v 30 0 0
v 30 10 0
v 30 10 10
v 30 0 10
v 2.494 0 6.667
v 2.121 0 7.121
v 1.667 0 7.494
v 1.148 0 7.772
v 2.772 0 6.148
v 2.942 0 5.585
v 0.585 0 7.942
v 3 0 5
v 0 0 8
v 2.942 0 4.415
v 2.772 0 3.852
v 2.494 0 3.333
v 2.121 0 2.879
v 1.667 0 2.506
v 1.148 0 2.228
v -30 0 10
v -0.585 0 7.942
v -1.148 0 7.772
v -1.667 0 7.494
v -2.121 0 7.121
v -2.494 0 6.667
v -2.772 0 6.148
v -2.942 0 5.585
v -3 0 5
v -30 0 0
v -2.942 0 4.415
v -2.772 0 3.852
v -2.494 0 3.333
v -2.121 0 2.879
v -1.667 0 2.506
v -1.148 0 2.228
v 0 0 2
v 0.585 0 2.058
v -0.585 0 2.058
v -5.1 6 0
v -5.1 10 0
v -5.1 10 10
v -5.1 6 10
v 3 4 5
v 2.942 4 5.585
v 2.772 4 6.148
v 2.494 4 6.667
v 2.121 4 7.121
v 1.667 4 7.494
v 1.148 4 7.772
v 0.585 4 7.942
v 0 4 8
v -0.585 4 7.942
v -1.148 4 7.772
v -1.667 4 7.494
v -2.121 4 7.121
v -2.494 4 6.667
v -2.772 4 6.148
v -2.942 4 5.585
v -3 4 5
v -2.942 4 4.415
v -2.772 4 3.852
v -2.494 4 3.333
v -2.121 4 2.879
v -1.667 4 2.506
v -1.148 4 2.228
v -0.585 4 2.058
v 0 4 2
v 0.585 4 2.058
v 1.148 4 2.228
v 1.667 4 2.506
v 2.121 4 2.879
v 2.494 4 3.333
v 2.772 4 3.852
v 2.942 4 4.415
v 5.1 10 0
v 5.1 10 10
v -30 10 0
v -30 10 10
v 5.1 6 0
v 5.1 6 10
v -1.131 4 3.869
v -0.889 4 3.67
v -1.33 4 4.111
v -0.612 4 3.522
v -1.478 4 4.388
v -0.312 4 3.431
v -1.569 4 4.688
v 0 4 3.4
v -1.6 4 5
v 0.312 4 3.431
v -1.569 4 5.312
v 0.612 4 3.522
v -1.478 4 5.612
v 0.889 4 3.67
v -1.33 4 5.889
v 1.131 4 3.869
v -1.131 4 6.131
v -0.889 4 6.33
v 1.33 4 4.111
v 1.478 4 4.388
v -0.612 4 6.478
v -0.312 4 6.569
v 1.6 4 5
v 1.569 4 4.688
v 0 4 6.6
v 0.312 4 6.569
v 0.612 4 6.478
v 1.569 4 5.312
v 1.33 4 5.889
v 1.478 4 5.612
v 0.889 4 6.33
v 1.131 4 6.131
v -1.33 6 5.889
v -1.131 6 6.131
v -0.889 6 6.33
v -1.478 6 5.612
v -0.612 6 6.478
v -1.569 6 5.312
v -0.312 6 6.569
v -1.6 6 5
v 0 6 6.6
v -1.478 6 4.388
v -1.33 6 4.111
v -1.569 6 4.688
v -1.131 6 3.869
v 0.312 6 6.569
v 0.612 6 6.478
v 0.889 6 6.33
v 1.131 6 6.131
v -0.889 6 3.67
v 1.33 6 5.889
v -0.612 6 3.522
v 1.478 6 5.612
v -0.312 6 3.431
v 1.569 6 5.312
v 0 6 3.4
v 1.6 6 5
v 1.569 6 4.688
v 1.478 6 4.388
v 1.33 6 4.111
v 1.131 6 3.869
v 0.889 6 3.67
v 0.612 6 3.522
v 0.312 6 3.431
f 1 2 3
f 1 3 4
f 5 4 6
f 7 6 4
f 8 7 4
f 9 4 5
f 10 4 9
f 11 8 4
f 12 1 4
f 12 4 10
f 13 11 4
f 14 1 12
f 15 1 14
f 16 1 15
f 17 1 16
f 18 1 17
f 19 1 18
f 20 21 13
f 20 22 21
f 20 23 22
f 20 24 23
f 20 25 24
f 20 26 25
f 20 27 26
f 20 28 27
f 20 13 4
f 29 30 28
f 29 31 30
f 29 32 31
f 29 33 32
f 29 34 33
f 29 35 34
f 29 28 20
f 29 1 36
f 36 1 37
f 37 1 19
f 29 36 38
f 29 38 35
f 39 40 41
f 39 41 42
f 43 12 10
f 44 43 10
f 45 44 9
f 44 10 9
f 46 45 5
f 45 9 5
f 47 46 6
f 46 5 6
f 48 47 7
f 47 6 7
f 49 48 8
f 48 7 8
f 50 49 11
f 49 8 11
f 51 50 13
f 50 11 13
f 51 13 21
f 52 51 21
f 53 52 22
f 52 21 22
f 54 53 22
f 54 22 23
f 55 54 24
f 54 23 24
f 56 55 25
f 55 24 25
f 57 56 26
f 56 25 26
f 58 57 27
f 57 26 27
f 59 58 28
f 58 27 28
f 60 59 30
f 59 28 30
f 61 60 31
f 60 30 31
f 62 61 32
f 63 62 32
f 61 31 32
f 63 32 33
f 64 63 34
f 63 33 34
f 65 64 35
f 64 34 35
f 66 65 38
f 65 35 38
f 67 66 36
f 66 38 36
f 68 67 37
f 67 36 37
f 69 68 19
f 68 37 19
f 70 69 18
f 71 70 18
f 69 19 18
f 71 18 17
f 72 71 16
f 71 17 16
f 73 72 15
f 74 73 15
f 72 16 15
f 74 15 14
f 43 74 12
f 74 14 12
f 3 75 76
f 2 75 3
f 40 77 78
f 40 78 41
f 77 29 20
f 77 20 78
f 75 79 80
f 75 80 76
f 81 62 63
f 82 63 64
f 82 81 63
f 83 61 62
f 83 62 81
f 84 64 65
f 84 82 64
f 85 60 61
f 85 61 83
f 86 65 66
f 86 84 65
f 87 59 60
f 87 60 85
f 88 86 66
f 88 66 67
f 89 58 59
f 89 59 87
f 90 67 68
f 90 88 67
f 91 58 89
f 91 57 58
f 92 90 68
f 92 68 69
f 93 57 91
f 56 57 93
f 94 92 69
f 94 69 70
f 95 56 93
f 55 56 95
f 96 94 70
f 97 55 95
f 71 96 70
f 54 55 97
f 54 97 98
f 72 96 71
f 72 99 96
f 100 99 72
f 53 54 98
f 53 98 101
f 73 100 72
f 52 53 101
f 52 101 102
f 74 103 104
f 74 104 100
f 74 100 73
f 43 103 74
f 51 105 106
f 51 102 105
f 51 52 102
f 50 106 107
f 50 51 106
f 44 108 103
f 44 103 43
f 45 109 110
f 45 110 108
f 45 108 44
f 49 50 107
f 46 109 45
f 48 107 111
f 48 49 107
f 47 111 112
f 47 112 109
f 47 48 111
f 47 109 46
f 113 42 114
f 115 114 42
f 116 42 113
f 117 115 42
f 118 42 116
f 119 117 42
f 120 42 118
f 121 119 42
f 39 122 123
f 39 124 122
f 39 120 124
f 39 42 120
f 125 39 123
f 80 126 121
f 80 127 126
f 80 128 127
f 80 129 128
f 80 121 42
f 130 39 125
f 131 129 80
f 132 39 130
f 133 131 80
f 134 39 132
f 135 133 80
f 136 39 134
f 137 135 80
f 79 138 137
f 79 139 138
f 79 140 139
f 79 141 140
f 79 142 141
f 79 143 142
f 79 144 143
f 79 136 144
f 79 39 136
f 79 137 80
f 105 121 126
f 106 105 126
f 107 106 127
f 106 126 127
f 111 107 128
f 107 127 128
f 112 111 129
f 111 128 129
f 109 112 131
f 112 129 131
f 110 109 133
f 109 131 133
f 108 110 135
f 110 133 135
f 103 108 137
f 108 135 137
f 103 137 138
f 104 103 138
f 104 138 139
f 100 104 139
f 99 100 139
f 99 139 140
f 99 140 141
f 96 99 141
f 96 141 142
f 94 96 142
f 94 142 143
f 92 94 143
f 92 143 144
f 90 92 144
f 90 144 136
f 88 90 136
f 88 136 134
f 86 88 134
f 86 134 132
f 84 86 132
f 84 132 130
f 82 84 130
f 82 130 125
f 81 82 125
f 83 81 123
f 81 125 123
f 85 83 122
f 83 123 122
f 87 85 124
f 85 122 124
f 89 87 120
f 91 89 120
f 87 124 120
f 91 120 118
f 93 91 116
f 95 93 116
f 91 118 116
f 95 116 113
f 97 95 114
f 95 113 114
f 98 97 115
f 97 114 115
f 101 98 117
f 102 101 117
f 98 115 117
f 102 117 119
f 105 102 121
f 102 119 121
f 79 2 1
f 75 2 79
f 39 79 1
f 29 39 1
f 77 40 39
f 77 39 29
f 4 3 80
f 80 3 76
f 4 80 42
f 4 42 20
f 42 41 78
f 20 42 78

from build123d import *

# Parameters (mm, degrees)
BOSS_EXTRUDE1_DEPTH = 10
SKETCH2_R           = 1.6
CUT_EXTRUDE1_DEPTH  = 10
SKETCH3_R           = 3
CUT_EXTRUDE2_DEPTH  = 4


with BuildPart() as part:
    # Sketch1 → Boss-Extrude1 (new body)
    with BuildSketch(Plane.XY):
        Polygon((-5.1, 10), (-5.1, 6), (5.1, 6), (5.1, 10), (30, 10), (30, 0), (-30, 0), (-30, 10), align=None)
    extrude(amount=BOSS_EXTRUDE1_DEPTH)

    # Sketch2 → Cut-Extrude1 (cut)
    with BuildSketch(Plane(origin=(0, 6, 0), x_dir=(1, 0, 0), z_dir=(0, 1, 0))):
        with Locations(Location((0, -5, 0), (0, 0, 270))):
            Circle(SKETCH2_R)
    extrude(amount=-CUT_EXTRUDE1_DEPTH, mode=Mode.SUBTRACT)

    # Sketch3 → Cut-Extrude2 (cut)
    with BuildSketch(Plane.XZ):
        with Locations((0, 5)):
            Circle(SKETCH3_R)
    extrude(amount=-CUT_EXTRUDE2_DEPTH, mode=Mode.SUBTRACT)


solid = part.part
